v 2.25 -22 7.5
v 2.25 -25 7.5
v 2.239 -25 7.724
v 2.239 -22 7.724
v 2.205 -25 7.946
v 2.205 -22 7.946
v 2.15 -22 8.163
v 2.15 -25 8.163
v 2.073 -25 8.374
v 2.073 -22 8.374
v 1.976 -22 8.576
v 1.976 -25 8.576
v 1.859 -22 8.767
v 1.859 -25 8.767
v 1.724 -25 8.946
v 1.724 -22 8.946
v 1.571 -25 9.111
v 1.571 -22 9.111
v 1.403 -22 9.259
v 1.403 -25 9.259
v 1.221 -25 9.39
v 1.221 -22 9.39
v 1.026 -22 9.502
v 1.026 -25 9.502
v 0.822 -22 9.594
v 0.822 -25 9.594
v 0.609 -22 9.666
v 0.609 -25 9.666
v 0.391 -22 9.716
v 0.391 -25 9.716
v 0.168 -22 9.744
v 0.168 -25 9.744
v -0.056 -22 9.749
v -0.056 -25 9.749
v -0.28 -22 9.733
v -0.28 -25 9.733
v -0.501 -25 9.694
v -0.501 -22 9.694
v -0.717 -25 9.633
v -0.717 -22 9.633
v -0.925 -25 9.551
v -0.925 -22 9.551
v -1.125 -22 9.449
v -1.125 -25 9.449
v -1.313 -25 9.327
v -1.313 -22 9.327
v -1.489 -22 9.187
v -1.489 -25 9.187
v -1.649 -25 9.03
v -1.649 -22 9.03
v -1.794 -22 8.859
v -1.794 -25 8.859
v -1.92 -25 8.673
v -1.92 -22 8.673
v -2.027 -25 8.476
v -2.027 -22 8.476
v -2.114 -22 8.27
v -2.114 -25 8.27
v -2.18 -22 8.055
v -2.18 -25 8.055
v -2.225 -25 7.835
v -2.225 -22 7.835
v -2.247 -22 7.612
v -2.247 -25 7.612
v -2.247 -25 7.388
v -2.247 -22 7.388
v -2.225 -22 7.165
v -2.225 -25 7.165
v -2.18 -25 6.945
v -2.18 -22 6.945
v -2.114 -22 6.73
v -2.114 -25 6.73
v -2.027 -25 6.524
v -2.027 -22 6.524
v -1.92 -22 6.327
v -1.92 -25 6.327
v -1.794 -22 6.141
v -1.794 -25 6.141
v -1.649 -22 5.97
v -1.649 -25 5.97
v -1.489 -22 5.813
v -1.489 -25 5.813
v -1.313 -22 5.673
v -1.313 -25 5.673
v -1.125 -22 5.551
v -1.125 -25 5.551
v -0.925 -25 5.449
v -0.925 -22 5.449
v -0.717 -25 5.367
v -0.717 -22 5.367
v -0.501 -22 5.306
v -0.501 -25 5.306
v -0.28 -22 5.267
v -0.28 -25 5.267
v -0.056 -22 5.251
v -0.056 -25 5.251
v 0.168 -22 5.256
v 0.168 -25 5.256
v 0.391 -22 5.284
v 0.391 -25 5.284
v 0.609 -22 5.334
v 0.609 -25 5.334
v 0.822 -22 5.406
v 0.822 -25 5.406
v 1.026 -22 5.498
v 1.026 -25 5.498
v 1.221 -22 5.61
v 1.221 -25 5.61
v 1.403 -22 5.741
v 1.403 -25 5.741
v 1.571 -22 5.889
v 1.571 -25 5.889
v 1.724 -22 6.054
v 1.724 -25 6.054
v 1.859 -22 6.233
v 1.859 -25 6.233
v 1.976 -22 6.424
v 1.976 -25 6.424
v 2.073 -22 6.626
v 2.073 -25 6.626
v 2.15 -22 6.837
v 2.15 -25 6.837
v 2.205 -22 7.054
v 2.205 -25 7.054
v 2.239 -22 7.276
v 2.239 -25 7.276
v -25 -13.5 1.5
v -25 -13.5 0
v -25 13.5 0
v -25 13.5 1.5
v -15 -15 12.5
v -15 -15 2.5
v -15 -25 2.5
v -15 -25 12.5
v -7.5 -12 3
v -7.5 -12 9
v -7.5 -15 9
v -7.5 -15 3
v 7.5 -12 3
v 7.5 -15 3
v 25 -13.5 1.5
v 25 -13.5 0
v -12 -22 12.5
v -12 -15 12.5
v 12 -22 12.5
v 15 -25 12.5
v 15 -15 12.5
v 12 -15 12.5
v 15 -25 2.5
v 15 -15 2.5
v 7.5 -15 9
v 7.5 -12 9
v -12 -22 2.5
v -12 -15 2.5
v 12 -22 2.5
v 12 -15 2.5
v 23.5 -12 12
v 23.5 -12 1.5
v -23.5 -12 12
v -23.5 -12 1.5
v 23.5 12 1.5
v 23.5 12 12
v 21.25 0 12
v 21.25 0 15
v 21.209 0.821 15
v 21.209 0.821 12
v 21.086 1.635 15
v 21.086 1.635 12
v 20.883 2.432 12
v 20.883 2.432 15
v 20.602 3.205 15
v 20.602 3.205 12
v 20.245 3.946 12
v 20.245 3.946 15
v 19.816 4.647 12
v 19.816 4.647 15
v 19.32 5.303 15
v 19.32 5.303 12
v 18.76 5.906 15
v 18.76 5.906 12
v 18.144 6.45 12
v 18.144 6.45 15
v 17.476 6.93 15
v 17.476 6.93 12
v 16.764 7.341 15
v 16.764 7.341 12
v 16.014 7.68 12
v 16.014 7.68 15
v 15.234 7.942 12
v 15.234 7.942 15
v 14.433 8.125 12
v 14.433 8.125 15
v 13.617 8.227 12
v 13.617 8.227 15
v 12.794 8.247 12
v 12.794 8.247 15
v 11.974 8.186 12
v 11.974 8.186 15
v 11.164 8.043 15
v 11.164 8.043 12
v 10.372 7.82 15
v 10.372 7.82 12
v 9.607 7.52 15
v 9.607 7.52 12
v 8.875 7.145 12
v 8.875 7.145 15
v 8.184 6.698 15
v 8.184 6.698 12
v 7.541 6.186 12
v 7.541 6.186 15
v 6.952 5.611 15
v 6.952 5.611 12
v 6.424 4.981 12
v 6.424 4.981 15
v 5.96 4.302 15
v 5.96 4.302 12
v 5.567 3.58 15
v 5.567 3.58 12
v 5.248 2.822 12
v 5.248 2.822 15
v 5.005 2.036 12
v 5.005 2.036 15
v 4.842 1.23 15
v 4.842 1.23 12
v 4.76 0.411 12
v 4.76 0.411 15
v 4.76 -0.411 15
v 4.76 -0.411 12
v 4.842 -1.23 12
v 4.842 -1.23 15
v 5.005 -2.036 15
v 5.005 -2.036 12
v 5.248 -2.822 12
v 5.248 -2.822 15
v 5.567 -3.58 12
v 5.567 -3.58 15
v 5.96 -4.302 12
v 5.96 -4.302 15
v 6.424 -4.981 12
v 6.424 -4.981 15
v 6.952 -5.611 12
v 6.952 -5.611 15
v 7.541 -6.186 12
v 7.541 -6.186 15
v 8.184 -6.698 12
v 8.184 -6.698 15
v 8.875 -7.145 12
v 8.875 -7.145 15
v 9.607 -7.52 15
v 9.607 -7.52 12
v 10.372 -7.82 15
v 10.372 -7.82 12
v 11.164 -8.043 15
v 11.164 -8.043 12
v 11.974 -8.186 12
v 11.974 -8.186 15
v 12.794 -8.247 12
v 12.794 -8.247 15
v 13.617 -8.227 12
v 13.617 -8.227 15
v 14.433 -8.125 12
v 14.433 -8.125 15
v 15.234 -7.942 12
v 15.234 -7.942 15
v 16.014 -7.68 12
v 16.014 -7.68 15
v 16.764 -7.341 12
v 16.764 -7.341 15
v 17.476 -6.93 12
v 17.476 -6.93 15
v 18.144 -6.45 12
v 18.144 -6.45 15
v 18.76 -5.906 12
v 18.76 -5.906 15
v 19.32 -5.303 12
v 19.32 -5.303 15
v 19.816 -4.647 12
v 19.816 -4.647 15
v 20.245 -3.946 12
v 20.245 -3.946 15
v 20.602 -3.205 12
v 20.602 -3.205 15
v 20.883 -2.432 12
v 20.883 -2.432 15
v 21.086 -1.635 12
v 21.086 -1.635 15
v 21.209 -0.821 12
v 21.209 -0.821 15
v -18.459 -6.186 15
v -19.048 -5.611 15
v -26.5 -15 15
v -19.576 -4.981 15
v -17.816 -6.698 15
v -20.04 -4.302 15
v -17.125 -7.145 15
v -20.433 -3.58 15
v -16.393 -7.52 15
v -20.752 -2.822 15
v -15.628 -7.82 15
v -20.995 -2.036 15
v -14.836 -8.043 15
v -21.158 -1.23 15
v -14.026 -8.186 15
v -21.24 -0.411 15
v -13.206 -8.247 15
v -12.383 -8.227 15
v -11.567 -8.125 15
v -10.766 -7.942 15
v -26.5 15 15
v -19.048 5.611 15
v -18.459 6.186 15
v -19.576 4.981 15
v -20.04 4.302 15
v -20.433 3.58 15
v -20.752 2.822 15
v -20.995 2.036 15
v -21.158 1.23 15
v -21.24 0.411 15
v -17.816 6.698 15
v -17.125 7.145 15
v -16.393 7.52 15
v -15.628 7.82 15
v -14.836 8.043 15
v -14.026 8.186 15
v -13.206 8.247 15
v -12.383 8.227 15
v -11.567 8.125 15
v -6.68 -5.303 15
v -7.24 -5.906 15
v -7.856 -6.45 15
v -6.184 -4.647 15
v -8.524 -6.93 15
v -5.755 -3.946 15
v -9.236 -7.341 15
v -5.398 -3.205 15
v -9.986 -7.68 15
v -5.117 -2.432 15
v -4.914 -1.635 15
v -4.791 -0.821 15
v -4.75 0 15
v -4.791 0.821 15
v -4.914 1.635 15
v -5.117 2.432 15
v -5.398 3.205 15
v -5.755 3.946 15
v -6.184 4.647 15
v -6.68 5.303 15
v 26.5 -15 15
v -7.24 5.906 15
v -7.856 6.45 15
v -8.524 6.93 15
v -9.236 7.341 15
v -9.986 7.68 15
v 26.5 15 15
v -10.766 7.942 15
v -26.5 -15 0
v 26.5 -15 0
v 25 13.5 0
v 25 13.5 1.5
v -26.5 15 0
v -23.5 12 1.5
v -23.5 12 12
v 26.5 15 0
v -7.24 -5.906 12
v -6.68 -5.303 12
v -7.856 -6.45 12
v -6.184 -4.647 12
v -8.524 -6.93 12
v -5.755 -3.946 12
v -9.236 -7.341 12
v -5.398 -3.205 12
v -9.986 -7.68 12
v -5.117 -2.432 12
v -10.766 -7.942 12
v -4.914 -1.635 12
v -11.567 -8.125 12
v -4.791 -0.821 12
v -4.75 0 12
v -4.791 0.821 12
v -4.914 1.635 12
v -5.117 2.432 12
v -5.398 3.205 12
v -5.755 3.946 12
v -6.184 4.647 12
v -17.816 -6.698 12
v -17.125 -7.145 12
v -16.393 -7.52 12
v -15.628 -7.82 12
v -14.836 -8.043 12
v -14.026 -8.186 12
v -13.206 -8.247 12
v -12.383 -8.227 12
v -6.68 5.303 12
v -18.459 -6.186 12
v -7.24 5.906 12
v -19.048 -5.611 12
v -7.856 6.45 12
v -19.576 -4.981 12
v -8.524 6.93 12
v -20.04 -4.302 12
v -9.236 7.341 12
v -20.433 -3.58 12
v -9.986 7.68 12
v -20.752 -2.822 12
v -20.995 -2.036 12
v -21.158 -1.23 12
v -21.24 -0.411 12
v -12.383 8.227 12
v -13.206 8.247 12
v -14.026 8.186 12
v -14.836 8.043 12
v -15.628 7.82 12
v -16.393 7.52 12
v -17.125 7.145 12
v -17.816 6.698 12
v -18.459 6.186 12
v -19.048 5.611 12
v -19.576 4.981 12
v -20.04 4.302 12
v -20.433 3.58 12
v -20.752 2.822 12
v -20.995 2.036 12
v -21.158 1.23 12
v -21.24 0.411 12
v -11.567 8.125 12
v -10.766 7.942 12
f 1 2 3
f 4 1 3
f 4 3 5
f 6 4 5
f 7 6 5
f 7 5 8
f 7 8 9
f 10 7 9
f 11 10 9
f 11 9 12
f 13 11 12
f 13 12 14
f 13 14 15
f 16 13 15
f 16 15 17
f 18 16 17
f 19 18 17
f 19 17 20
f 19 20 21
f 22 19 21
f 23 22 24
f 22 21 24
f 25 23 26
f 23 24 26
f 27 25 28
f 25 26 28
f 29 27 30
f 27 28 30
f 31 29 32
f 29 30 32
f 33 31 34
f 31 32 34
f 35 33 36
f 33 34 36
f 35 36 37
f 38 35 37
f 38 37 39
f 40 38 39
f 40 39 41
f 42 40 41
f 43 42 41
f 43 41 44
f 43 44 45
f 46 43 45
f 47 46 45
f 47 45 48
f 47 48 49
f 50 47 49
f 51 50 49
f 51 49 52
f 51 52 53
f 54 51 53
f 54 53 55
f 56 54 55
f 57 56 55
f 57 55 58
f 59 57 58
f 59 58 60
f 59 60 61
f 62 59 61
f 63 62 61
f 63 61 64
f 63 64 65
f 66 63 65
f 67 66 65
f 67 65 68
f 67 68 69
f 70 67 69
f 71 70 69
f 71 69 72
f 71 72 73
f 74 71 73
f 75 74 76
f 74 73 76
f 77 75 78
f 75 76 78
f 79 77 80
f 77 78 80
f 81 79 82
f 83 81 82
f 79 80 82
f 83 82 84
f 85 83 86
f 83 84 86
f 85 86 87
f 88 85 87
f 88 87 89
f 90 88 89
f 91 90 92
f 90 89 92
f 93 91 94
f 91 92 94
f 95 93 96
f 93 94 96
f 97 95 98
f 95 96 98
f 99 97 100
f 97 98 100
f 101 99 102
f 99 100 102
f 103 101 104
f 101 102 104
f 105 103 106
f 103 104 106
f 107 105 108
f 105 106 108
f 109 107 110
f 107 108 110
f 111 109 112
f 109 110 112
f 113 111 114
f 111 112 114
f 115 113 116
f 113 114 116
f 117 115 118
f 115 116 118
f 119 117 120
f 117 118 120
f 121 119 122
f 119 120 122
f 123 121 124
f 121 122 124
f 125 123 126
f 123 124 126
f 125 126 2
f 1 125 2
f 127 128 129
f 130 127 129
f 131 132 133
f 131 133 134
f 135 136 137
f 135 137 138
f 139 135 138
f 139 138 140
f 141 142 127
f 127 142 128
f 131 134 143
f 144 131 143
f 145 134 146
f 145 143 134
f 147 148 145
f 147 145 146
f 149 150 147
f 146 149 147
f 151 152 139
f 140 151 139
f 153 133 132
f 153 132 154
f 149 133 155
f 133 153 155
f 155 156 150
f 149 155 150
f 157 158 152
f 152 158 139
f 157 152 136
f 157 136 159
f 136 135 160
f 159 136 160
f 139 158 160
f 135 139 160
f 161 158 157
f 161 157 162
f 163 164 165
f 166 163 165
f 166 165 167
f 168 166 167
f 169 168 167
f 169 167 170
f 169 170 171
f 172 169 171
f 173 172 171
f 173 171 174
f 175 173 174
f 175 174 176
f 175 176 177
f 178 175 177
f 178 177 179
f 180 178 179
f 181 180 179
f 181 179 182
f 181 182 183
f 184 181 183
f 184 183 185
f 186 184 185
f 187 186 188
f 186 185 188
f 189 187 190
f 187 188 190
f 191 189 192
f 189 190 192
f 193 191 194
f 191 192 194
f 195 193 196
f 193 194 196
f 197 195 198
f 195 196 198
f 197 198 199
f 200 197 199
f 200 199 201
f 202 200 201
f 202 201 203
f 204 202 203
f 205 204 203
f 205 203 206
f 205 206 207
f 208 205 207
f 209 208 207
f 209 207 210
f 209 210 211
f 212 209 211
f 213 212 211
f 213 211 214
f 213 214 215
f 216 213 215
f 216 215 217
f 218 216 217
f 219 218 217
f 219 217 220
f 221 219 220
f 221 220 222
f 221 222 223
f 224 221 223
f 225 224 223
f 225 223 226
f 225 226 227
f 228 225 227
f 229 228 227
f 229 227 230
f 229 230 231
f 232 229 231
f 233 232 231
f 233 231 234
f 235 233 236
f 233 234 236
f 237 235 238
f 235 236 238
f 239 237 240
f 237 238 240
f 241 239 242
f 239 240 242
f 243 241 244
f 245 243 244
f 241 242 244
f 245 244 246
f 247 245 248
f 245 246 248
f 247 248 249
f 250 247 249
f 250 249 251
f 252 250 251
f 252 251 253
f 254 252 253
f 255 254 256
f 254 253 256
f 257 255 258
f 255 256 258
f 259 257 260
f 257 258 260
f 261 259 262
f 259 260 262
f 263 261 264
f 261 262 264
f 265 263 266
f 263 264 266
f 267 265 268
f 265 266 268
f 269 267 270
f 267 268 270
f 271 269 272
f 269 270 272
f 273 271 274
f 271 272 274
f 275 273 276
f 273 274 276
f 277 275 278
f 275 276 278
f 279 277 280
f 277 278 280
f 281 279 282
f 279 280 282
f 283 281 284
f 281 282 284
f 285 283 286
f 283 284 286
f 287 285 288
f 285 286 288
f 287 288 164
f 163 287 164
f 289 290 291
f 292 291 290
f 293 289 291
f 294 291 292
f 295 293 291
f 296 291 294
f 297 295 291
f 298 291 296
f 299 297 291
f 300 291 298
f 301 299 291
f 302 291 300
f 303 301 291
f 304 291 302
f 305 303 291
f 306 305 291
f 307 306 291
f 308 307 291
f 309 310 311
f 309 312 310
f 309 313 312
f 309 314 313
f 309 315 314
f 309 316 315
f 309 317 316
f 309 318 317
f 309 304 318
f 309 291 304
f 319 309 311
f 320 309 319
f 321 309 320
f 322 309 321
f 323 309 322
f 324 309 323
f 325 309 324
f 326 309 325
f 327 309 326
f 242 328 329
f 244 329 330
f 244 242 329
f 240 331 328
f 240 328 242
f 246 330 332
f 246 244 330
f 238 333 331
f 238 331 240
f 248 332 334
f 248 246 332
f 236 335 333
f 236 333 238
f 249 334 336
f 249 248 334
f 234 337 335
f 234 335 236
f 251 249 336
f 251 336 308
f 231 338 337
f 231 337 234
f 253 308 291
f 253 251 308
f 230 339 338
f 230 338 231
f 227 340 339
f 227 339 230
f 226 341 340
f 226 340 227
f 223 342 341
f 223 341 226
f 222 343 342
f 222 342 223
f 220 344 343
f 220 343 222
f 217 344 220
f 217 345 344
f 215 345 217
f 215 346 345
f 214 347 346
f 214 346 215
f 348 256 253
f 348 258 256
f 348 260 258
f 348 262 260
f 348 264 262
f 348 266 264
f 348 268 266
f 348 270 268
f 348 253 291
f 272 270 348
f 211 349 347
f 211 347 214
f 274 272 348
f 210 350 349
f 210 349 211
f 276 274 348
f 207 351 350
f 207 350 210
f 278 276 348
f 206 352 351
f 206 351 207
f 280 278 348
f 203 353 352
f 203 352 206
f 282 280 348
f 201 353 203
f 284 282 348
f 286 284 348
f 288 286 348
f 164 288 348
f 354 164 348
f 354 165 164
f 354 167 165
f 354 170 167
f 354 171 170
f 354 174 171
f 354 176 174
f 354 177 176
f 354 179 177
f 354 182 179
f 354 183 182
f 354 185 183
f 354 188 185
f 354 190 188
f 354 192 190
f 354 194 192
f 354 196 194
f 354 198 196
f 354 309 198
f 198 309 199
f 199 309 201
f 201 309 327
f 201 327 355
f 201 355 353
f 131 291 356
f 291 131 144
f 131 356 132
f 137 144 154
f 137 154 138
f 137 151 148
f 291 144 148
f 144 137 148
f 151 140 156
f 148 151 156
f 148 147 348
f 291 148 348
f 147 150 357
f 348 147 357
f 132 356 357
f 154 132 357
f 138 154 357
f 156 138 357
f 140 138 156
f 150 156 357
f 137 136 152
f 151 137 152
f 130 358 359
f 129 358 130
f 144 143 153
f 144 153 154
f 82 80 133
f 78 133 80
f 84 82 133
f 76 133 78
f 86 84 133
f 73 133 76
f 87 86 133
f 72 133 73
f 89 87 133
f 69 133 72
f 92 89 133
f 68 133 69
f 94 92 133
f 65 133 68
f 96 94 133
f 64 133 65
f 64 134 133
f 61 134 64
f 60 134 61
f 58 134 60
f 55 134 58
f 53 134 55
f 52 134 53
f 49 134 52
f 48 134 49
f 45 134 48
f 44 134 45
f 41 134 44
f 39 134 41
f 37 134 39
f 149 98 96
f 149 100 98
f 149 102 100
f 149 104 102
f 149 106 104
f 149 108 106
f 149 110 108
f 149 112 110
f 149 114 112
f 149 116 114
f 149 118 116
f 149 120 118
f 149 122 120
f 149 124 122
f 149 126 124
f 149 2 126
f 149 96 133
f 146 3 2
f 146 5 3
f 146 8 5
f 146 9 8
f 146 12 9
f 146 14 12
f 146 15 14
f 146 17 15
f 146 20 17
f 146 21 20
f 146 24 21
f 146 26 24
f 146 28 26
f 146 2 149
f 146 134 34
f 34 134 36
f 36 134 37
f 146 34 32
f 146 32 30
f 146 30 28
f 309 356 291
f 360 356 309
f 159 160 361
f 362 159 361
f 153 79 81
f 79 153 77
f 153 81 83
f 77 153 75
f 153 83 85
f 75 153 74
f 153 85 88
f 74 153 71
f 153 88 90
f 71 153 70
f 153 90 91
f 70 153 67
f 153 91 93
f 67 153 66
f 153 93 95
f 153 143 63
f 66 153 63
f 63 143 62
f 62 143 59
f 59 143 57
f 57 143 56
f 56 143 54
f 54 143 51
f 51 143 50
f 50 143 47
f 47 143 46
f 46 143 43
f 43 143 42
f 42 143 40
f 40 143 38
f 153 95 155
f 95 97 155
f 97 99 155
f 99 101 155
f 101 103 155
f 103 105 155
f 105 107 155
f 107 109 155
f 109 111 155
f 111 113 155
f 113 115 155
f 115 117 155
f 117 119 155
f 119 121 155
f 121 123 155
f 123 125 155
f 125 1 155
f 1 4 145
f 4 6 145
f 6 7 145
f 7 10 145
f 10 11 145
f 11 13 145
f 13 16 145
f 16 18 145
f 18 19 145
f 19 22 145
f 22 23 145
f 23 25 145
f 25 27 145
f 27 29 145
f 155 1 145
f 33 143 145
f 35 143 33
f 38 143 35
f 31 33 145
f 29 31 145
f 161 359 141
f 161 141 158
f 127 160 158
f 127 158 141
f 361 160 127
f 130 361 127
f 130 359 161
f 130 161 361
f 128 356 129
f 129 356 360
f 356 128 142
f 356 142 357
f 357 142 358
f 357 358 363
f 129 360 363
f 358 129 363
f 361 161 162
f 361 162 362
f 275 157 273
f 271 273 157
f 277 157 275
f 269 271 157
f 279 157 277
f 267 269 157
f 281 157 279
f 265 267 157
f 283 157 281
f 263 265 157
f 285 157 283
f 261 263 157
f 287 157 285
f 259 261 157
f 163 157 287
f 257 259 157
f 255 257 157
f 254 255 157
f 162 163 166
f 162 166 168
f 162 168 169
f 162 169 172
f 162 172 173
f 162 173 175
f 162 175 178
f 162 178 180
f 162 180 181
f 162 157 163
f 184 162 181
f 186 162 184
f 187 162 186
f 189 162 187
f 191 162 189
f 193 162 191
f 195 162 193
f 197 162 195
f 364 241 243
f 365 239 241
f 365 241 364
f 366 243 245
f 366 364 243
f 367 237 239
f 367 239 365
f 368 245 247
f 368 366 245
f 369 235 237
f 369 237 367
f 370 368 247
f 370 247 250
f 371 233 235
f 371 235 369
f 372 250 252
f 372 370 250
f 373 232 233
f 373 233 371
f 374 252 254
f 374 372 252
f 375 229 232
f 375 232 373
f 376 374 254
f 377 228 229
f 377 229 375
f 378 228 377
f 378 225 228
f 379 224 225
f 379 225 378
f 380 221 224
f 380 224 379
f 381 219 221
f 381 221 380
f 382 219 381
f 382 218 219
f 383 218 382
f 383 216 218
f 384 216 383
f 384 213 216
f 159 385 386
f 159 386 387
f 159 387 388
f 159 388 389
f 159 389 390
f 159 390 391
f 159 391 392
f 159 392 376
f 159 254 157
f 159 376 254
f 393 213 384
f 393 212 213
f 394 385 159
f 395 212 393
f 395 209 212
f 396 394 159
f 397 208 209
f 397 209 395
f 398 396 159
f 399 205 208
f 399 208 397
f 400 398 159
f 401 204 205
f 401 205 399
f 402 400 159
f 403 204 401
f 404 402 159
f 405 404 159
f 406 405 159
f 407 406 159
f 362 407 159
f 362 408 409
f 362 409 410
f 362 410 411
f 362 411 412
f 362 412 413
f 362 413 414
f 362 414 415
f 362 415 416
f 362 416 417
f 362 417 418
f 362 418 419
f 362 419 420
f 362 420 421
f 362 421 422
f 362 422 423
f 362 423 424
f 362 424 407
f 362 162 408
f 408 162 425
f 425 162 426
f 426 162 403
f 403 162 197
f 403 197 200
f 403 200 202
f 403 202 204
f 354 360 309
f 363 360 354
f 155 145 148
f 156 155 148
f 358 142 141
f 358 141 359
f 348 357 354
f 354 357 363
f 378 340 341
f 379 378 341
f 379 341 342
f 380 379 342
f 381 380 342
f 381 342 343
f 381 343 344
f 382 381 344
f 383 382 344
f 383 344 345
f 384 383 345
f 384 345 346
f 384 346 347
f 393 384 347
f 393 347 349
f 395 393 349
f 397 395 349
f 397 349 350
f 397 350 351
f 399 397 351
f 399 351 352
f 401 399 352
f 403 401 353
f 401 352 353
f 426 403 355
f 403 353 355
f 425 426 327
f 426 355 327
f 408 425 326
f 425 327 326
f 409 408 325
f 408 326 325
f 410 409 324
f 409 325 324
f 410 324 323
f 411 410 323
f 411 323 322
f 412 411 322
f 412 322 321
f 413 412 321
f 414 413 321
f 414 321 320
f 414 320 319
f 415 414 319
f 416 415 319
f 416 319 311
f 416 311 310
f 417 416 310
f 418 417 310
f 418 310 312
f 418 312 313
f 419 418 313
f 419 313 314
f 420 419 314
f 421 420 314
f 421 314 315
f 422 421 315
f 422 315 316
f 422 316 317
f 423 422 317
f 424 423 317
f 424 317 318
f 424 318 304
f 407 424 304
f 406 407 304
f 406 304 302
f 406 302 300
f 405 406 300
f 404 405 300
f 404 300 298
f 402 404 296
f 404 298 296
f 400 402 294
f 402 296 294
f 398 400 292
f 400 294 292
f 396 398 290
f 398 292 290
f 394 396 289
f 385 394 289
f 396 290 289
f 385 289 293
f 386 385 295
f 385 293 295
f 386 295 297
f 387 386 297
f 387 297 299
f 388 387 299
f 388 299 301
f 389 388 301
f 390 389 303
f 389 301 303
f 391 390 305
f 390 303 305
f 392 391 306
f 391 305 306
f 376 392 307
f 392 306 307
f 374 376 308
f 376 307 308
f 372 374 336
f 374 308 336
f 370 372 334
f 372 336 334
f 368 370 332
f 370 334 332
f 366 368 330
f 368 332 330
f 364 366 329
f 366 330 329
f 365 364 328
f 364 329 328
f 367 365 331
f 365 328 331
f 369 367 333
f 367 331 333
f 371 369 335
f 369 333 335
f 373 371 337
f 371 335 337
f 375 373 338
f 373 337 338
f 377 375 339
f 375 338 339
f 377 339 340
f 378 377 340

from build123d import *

# Parameters (mm, degrees)
SKETCH1_W           = 53
SKETCH1_H           = 30
BOSS_EXTRUDE1_DEPTH = 15
SKETCH2_R           = 8.25
CUT_EXTRUDE1_DEPTH  = 16
SKETCH3_W           = 47
SKETCH3_H           = 24
CUT_EXTRUDE2_DEPTH  = 12
SKETCH4_W           = 15
SKETCH4_H           = 6
CUT_EXTRUDE3_DEPTH  = 12
SKETCH6_W           = 50
SKETCH6_H           = 27
CUT_EXTRUDE4_DEPTH  = 1.5
SKETCH7_W           = 30
SKETCH7_H           = 10
BOSS_EXTRUDE2_DEPTH = 10
SKETCH8_W           = 24
SKETCH8_H           = 7
CUT_EXTRUDE5_DEPTH  = 13.5
SKETCH9_R           = 2.25
CUT_EXTRUDE6_DEPTH  = 4


with BuildPart() as part:
    # Sketch1 → Boss-Extrude1 (new body)
    with BuildSketch(Plane.XY):
        Rectangle(SKETCH1_W, SKETCH1_H)
    extrude(amount=BOSS_EXTRUDE1_DEPTH)

    # Sketch2 → Cut-Extrude1 (cut, through all)
    with BuildSketch(Plane.XY.offset(15)):
        with Locations((13, 0)):
            Circle(SKETCH2_R)
        with Locations((-13, 0)):
            Circle(SKETCH2_R)
    extrude(amount=-CUT_EXTRUDE1_DEPTH, mode=Mode.SUBTRACT)

    # Sketch3 → Cut-Extrude2 (cut)
    with BuildSketch(Plane(origin=(0, 0, 0), x_dir=(-1, 0, 0), z_dir=(0, 0, -1))):
        Rectangle(SKETCH3_W, SKETCH3_H)
    extrude(amount=-CUT_EXTRUDE2_DEPTH, mode=Mode.SUBTRACT)

    # Sketch4 → Cut-Extrude3 (cut)
    with BuildSketch(Plane(origin=(0, -12, 0), x_dir=(1, 0, 0), z_dir=(0, 1, 0))):
        with Locations((0, -6)):
            Rectangle(SKETCH4_W, SKETCH4_H)
    extrude(amount=-CUT_EXTRUDE3_DEPTH, mode=Mode.SUBTRACT)

    # Sketch6 → Cut-Extrude4 (cut)
    with BuildSketch(Plane(origin=(0, 0, 0), x_dir=(-1, 0, 0), z_dir=(0, 0, -1))):
        Rectangle(SKETCH6_W, SKETCH6_H)
    extrude(amount=-CUT_EXTRUDE4_DEPTH, mode=Mode.SUBTRACT)

    # Sketch7 → Boss-Extrude2 (add)
    with BuildSketch(Plane.XZ.offset(15)):
        with Locations((0, 7.5)):
            Rectangle(SKETCH7_W, SKETCH7_H)
    extrude(amount=BOSS_EXTRUDE2_DEPTH)

    # Sketch8 → Cut-Extrude5 (cut, through all)
    with BuildSketch(Plane.XY.offset(12.5)):
        with Locations((0, -18.5)):
            Rectangle(SKETCH8_W, SKETCH8_H)
    extrude(amount=-CUT_EXTRUDE5_DEPTH, mode=Mode.SUBTRACT)

    # Sketch9 → Cut-Extrude6 (cut)
    with BuildSketch(Plane.XZ.offset(25)):
        with Locations((0, 7.5)):
            Circle(SKETCH9_R)
    extrude(amount=-CUT_EXTRUDE6_DEPTH, mode=Mode.SUBTRACT)


solid = part.part
